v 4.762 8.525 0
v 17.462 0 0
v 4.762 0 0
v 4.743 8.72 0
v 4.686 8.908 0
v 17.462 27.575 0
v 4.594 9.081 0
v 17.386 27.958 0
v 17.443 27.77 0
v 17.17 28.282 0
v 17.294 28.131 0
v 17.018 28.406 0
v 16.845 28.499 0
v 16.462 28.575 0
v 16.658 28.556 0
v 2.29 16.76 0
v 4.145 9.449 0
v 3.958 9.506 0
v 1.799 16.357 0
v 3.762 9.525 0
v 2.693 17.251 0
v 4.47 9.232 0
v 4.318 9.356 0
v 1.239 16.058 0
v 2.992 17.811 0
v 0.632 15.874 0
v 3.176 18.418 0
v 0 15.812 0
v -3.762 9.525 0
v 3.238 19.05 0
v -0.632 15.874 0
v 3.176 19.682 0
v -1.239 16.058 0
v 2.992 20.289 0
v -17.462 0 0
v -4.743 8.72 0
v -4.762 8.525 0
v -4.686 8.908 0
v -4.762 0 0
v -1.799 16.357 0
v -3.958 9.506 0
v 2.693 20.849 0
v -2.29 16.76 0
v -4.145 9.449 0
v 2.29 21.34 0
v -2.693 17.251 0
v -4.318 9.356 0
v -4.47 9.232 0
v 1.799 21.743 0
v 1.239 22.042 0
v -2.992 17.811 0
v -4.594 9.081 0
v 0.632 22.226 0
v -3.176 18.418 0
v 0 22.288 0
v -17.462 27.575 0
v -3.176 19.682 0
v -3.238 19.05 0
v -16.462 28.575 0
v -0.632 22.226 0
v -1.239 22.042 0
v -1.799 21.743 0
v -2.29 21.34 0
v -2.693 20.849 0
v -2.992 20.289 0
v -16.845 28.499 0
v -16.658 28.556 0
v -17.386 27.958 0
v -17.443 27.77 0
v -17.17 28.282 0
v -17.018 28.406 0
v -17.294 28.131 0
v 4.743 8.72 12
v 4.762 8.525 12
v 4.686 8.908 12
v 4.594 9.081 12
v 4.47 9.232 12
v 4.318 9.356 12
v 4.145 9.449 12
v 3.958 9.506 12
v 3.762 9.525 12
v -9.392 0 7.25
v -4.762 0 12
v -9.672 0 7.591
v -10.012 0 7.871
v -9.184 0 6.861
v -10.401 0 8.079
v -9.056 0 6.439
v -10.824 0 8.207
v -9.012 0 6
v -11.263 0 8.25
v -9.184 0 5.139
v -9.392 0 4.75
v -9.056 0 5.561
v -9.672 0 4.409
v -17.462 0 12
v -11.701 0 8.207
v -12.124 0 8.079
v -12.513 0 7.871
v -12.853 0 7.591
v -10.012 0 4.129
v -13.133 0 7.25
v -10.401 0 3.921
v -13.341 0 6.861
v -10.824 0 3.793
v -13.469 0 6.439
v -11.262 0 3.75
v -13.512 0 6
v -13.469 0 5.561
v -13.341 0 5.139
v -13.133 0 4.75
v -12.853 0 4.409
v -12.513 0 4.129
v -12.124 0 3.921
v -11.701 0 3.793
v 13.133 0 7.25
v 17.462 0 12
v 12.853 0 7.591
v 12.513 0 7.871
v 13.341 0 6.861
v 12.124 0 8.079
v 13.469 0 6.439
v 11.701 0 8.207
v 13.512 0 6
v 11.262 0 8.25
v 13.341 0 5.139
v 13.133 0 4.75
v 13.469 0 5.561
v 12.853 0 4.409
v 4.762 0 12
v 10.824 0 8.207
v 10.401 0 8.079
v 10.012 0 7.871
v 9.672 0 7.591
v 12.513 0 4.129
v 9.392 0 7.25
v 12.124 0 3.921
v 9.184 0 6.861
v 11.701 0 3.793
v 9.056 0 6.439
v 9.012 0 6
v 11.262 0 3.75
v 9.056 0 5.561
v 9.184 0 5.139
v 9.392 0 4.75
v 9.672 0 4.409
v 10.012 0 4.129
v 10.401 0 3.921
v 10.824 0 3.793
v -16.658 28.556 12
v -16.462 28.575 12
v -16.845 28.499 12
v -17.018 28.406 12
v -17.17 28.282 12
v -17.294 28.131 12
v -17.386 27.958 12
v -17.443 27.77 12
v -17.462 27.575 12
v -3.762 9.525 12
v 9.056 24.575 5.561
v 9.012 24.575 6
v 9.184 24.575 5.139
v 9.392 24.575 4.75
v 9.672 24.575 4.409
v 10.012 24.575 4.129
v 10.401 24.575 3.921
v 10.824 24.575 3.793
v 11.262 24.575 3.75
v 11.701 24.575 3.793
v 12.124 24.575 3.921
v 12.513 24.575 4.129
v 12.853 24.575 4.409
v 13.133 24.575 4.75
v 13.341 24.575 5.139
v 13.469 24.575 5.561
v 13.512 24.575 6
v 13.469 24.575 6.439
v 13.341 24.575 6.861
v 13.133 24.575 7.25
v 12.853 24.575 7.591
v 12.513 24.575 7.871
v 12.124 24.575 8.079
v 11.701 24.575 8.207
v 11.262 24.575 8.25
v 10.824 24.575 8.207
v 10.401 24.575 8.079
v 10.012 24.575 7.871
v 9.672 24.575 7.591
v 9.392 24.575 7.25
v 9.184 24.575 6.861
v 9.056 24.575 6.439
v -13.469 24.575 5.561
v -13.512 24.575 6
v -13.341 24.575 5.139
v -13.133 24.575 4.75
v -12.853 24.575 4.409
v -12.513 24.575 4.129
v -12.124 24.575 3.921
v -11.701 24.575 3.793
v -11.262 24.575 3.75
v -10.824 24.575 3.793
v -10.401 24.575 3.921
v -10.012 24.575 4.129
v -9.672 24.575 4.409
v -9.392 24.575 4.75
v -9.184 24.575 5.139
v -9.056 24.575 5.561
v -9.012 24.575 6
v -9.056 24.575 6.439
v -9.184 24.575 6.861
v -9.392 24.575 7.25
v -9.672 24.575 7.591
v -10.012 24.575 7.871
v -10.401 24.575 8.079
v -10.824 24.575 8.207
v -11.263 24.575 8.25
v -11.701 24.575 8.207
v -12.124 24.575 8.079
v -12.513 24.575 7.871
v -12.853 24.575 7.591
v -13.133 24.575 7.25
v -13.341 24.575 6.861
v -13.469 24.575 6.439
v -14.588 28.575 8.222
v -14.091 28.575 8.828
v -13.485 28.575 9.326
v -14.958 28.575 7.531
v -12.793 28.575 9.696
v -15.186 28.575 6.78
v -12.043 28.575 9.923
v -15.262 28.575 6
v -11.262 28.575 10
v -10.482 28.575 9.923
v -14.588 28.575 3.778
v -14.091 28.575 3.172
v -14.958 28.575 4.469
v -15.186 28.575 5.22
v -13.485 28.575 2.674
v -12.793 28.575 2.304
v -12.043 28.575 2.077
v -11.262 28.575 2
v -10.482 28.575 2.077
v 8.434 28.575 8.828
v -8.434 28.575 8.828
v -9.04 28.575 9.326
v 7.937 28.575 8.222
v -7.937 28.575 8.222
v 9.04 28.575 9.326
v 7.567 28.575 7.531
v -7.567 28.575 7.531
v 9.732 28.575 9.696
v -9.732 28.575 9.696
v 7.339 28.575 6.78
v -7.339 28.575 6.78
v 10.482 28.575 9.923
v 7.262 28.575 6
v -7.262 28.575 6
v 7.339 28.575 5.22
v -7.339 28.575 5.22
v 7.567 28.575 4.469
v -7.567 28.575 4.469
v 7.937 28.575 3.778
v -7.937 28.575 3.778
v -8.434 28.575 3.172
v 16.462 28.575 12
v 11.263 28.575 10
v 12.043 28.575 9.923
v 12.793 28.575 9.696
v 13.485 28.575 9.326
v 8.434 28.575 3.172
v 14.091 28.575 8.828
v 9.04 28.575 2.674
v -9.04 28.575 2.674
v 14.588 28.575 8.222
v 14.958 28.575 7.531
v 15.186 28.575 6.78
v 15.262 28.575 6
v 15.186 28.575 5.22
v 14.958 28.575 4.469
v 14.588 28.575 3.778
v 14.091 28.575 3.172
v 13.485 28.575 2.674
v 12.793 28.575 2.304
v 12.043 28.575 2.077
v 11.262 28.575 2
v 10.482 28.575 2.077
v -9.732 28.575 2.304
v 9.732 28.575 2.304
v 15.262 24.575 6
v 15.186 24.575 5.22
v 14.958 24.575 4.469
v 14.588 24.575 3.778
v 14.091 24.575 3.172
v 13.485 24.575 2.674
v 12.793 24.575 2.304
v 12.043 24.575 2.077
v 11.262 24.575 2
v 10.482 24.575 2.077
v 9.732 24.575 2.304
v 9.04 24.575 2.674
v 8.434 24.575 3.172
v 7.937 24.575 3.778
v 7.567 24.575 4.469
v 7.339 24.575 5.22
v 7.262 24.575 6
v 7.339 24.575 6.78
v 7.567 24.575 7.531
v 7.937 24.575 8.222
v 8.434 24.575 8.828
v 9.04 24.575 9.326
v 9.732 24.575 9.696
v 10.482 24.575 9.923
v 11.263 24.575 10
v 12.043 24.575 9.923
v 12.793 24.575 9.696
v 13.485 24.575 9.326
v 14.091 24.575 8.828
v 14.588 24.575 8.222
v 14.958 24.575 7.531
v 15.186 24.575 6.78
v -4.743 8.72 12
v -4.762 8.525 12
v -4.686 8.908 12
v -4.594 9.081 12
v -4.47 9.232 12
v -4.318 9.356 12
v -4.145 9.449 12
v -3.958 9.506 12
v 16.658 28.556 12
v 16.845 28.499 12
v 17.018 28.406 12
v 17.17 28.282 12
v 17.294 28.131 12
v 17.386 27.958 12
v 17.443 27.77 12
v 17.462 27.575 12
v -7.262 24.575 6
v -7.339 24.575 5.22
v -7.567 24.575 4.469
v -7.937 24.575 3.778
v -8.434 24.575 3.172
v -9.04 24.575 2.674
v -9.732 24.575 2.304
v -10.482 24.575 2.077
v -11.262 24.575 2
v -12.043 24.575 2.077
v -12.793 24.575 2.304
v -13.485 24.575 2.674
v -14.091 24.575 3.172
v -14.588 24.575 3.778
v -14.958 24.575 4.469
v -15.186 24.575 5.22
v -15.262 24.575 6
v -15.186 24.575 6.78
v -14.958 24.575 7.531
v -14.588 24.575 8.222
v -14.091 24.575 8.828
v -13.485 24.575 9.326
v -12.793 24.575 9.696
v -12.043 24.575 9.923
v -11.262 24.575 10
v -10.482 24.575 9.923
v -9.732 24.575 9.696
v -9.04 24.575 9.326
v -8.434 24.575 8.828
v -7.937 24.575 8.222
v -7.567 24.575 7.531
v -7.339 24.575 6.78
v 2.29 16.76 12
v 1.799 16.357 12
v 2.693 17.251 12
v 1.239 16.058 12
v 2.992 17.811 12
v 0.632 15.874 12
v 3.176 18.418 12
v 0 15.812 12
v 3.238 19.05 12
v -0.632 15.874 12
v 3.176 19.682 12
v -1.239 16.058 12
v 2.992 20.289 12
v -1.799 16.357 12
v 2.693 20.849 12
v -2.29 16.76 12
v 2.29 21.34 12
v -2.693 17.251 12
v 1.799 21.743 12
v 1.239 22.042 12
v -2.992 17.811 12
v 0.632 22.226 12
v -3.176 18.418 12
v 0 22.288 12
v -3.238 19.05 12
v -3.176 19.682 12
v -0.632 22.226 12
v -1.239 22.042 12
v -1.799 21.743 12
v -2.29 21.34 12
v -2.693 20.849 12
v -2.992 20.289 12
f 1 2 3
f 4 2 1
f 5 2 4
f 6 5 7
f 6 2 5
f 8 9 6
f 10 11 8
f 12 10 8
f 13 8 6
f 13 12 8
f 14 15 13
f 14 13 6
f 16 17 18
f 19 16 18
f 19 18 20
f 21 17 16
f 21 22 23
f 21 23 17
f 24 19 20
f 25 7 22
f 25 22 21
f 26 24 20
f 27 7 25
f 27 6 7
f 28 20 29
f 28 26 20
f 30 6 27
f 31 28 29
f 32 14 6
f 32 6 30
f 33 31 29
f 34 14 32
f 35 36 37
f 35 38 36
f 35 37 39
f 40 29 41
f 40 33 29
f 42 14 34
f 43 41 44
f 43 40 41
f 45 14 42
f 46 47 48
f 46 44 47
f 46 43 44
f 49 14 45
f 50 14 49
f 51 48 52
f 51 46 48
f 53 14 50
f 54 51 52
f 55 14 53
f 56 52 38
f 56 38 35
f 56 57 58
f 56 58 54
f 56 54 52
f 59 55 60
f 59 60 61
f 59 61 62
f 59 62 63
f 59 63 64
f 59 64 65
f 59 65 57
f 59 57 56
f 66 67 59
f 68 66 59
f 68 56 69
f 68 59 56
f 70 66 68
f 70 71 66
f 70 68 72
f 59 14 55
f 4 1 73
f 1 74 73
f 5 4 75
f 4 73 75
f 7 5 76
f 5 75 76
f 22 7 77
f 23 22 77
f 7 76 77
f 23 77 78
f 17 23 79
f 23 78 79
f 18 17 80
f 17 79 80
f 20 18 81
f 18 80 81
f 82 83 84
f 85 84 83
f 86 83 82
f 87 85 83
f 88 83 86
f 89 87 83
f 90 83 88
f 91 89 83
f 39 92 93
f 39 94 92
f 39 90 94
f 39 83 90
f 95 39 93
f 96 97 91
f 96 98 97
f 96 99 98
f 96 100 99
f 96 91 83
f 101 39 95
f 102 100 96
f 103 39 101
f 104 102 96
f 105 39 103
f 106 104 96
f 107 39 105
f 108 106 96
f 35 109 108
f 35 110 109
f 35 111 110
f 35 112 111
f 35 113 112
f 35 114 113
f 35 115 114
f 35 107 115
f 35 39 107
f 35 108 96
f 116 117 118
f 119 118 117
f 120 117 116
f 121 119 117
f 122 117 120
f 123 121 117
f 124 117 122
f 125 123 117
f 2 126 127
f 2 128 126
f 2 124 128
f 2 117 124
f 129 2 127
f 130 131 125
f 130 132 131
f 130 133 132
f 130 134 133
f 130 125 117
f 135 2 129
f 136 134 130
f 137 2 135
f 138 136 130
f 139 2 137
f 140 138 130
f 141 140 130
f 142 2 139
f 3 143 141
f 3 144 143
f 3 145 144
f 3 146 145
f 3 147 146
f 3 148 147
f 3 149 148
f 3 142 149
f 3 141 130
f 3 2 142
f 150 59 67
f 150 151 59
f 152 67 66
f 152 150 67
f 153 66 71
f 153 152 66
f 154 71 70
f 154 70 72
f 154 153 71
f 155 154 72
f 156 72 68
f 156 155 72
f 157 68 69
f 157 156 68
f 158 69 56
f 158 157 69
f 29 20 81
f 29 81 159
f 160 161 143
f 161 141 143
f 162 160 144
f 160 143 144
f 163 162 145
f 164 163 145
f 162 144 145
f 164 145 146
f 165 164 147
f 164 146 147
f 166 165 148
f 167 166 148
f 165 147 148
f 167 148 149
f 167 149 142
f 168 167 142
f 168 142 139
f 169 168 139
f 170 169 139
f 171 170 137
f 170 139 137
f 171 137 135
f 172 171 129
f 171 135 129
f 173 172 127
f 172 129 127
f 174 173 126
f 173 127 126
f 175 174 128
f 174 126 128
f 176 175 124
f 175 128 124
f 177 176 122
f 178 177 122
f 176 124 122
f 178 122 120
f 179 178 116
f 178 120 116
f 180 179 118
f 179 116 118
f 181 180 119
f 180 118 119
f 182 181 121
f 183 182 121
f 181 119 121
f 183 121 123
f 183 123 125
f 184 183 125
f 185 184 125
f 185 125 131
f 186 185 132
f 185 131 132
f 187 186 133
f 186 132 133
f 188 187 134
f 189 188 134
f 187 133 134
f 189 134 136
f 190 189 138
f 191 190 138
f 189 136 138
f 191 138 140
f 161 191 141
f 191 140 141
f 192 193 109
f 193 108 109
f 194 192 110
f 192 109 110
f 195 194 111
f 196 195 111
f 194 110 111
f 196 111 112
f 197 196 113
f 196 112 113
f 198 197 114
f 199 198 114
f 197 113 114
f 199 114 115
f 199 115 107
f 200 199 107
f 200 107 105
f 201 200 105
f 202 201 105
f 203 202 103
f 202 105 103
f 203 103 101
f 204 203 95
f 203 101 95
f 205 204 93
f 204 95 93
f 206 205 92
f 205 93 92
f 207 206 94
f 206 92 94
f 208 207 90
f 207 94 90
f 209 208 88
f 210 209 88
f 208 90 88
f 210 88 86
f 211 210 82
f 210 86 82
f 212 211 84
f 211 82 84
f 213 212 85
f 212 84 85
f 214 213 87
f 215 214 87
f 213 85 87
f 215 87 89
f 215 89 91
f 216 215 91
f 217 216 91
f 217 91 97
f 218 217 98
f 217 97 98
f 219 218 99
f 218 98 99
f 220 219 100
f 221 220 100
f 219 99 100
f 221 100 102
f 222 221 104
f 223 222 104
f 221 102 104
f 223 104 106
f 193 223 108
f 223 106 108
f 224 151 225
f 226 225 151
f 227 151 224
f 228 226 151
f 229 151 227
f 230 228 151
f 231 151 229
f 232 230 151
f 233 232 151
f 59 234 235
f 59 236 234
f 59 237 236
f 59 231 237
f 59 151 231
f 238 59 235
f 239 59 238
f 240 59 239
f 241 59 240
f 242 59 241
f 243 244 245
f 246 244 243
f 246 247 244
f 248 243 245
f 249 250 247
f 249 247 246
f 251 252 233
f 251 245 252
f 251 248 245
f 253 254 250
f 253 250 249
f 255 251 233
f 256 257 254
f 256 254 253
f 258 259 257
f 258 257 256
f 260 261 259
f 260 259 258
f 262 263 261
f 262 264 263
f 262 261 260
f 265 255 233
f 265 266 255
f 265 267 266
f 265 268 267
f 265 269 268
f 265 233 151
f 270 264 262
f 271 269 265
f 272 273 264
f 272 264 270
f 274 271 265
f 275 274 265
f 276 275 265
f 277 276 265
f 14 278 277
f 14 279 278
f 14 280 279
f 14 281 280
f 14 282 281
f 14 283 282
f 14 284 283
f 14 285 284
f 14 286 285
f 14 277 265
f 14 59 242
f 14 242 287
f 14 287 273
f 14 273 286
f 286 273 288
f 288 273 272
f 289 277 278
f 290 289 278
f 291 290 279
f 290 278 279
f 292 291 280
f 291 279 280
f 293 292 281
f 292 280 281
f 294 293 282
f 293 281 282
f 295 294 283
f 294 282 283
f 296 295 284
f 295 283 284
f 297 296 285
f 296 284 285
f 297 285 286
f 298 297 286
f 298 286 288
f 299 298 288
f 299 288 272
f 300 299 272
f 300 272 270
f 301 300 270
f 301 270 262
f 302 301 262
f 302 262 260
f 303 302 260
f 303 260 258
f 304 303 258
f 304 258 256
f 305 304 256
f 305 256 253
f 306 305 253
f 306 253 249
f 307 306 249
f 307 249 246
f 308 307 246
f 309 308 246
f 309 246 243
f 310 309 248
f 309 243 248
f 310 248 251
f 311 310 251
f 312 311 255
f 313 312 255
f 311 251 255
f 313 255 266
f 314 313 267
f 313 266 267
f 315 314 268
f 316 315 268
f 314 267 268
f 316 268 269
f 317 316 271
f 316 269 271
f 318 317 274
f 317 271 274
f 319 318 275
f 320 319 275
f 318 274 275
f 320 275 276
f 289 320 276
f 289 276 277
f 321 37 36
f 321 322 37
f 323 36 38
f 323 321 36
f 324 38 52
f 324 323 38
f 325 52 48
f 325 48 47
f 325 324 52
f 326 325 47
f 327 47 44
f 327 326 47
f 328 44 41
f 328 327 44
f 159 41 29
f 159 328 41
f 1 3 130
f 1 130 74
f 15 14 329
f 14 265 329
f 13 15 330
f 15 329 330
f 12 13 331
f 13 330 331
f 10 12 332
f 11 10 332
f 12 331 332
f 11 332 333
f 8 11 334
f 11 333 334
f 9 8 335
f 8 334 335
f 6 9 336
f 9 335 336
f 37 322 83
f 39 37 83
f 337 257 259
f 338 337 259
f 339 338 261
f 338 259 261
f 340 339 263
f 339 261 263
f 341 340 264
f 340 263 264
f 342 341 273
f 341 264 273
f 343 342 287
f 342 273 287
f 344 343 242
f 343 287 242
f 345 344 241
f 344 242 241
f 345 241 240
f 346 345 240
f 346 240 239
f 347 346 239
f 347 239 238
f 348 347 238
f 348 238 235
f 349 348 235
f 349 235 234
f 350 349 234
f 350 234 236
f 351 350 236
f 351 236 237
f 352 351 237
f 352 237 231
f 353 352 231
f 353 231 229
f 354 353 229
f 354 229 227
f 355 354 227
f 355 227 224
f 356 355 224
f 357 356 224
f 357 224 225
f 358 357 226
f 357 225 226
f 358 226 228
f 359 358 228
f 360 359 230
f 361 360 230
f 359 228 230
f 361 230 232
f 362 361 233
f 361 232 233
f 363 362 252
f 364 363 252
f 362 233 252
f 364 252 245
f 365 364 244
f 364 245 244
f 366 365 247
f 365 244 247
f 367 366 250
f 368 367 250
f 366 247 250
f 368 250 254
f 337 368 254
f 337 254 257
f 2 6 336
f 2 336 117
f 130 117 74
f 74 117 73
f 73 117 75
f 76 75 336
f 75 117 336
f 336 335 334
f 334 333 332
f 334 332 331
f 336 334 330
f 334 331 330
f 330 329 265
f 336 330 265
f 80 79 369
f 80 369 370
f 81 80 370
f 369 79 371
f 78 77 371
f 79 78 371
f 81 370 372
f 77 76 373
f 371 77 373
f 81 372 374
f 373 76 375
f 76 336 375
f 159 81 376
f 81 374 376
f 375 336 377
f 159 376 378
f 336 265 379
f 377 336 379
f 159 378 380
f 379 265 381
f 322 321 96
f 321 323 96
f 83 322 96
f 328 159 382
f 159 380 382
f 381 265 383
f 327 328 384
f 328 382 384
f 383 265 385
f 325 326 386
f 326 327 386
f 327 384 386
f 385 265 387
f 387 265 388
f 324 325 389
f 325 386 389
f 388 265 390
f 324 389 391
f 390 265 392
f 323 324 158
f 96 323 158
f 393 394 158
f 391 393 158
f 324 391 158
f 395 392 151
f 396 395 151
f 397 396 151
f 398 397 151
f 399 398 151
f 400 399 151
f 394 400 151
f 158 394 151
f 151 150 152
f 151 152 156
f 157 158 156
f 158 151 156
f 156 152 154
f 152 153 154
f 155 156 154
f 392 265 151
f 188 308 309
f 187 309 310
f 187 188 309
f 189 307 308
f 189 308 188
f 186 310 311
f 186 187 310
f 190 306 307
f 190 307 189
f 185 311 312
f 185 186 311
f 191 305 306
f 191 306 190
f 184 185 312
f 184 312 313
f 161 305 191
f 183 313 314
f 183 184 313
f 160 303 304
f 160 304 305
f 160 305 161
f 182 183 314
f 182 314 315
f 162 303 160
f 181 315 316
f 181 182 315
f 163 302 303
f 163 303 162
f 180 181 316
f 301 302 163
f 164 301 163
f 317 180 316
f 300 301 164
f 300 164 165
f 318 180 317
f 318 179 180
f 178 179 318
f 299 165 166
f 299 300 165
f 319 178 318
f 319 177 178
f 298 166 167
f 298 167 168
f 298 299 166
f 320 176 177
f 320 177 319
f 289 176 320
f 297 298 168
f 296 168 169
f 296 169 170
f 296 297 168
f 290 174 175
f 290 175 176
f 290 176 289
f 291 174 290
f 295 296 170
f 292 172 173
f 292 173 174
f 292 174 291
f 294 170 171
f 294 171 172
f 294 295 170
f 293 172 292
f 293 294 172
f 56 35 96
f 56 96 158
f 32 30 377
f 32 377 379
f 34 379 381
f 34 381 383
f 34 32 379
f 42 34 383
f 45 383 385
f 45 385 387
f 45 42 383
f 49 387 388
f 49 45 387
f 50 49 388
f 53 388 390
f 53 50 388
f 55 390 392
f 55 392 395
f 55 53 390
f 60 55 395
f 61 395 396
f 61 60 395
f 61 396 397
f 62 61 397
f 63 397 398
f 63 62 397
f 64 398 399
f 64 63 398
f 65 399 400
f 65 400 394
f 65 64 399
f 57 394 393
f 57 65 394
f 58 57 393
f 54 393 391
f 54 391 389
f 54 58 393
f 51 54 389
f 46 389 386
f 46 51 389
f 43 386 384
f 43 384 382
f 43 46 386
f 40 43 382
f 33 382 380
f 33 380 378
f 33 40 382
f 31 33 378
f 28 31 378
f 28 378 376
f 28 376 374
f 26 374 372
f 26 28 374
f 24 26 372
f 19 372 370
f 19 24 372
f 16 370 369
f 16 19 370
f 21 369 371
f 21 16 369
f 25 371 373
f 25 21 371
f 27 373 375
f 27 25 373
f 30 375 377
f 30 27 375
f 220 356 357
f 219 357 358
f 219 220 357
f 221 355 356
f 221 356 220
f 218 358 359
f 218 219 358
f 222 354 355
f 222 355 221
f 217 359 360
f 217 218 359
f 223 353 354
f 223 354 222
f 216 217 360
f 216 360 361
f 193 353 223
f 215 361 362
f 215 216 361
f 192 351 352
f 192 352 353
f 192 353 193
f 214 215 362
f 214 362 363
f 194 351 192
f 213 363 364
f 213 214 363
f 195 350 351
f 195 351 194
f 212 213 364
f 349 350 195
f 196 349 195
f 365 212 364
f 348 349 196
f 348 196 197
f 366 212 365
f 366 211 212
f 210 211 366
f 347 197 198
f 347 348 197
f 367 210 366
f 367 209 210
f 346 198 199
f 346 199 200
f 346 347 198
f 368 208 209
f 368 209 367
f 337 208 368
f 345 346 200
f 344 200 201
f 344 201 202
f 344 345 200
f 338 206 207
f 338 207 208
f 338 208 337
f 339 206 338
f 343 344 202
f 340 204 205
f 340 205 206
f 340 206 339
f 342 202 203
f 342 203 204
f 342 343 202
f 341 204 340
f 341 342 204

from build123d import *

# Parameters (mm, degrees)
SKETCH1_R                      = 3.2385
BOSS_EXTRUDE1_DEPTH            = 12
CBORE_FOR_M4_SHCS1_D           = 4.5
CBORE_FOR_M4_SHCS1_CBORE_D     = 8
CBORE_FOR_M4_SHCS1_CBORE_DEPTH = 4
FILLET1_R                      = 1


with BuildPart() as part:
    # Sketch1 → Boss-Extrude1 (new body)
    with BuildSketch(Plane.XY):
        Polygon((-17.4625, 28.575), (17.4625, 28.575), (17.4625, 0), (4.7625, 0), (4.7625, 9.525), (-4.7625, 9.525), (-4.7625, 0), (-17.4625, 0), align=None)
        with Locations((0, 19.05)):
            Circle(SKETCH1_R, mode=Mode.SUBTRACT)
    extrude(amount=BOSS_EXTRUDE1_DEPTH)

    # CBORE for M4 SHCS1 (through all)
    with Locations(Plane(origin=(0, 28.575, 0), x_dir=(1, 0, 0), z_dir=(0, 1, 0))):
        with Locations((-11.2625, -6), (11.2625, -6)):
            CounterBoreHole(CBORE_FOR_M4_SHCS1_D / 2, CBORE_FOR_M4_SHCS1_CBORE_D / 2, CBORE_FOR_M4_SHCS1_CBORE_DEPTH)

    # Fillet1
    fillet1_edges = [part.edges().sort_by_distance(p)[0] for p in [
        (4.7625, 9.525, 6),
        (-4.7625, 9.525, 6),
        (-17.4625, 28.575, 6),
        (17.4625, 28.575, 6),
    ]]
    fillet(fillet1_edges, radius=FILLET1_R)


solid = part.part
